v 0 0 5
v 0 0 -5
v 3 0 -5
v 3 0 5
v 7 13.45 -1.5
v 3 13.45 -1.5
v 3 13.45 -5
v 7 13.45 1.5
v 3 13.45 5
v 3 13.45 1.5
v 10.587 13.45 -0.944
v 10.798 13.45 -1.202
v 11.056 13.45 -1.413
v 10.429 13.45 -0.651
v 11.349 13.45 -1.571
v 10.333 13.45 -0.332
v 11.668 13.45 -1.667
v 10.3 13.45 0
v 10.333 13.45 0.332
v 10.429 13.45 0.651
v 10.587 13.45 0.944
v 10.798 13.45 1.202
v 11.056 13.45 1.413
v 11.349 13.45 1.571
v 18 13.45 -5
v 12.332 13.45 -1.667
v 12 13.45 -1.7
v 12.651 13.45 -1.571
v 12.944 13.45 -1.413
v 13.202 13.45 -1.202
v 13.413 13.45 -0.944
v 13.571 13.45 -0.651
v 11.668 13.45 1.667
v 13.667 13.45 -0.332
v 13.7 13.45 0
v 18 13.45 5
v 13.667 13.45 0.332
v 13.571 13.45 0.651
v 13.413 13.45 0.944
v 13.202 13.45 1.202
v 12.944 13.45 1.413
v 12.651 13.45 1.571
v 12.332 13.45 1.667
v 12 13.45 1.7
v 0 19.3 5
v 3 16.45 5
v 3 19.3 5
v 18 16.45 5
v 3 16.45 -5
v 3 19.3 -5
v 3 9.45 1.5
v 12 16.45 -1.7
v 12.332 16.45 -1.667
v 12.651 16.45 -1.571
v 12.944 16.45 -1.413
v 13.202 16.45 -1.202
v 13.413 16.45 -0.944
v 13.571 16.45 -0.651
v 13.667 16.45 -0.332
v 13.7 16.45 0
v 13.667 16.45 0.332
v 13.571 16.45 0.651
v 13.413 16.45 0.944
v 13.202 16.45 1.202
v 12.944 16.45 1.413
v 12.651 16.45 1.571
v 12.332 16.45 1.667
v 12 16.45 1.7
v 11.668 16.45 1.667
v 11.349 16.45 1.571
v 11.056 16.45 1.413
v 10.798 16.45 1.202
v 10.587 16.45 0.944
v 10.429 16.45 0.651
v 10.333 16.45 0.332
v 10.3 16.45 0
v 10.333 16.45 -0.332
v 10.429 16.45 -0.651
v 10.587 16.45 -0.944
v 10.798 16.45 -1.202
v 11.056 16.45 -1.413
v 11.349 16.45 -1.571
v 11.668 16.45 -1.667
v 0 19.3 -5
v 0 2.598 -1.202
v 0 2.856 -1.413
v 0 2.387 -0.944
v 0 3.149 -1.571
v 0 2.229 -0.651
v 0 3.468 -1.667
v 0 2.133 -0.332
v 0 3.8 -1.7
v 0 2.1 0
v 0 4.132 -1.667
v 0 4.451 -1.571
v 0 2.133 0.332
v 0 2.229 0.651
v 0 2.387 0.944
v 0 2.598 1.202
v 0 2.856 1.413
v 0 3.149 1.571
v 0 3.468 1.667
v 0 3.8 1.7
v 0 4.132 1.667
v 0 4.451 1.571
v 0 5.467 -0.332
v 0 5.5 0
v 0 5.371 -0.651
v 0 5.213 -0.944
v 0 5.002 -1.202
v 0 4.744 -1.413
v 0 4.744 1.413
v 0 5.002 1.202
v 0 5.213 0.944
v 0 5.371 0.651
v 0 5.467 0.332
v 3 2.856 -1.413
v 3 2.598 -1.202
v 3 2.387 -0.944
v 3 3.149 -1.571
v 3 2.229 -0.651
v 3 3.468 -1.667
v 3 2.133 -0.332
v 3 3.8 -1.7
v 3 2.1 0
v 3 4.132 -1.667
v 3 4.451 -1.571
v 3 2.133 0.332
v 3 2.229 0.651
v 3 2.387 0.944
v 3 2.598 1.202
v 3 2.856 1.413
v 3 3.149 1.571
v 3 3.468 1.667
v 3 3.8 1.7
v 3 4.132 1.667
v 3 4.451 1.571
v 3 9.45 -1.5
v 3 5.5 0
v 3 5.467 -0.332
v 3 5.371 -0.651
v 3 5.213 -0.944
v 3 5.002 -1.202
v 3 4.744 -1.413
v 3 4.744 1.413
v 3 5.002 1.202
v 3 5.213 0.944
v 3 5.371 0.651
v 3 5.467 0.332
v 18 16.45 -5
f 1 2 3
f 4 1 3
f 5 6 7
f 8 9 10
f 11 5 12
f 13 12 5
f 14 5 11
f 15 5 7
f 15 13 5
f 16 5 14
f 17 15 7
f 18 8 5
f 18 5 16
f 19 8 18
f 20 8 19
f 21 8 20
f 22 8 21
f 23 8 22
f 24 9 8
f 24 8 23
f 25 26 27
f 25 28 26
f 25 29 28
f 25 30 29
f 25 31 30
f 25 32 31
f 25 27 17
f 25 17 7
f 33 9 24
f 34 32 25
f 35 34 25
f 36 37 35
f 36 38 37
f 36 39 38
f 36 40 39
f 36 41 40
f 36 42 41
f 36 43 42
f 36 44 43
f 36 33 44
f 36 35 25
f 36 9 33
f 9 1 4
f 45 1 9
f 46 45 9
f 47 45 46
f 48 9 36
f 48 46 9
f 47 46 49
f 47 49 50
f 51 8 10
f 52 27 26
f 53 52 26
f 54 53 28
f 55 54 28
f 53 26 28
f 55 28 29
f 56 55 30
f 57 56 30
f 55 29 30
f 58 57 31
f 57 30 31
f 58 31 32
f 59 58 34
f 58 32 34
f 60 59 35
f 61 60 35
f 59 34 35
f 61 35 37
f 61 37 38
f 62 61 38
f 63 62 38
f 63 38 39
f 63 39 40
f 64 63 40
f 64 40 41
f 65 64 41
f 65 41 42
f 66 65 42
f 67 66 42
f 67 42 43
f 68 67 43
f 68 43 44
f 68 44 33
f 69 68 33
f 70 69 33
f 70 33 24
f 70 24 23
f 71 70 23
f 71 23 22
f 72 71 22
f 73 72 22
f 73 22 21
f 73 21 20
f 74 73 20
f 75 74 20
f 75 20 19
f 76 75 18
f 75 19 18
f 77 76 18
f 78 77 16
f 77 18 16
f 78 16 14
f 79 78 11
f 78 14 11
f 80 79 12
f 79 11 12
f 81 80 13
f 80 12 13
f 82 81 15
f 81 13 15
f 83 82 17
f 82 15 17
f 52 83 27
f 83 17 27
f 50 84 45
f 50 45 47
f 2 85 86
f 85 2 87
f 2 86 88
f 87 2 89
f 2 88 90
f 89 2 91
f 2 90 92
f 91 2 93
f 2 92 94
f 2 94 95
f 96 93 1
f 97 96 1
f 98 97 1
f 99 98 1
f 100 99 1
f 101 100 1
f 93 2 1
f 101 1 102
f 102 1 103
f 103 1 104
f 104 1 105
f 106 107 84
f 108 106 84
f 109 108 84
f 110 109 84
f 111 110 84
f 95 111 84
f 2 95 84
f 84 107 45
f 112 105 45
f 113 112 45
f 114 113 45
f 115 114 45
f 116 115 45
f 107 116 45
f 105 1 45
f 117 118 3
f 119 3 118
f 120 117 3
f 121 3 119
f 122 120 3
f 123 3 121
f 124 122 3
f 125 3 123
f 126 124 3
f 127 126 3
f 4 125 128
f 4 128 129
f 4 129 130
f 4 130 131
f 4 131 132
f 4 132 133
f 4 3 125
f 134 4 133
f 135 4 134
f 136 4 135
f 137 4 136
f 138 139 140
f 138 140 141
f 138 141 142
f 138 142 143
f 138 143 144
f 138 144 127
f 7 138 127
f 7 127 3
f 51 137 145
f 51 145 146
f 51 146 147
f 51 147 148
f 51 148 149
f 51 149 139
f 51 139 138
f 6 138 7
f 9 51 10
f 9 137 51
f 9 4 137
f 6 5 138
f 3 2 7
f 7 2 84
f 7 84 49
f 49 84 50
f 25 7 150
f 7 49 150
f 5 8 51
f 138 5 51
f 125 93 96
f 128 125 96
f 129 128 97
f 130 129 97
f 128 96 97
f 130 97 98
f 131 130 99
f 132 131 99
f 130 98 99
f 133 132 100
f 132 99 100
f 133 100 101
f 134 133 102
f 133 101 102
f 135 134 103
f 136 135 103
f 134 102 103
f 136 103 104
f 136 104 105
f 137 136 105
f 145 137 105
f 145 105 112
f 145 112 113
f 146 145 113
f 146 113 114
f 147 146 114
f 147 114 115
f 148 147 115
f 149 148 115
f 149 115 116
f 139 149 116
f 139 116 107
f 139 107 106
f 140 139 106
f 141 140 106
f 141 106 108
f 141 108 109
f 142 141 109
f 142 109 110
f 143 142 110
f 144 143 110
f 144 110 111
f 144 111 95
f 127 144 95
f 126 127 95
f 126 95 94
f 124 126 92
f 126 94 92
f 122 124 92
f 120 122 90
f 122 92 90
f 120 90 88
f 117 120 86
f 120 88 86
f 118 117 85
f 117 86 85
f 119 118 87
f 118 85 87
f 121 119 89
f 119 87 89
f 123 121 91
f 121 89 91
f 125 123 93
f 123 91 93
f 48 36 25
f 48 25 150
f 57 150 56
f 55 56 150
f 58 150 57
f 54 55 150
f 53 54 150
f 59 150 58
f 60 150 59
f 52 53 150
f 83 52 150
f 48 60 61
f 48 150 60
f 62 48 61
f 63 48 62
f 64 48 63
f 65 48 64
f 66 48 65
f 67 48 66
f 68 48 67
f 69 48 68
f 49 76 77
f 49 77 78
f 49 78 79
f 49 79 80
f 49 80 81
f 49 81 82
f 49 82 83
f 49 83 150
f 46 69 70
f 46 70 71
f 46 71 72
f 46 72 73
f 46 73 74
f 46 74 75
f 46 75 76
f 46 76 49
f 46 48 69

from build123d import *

# Parameters (mm, degrees)
BOSS_EXTRUDE1_DEPTH = 5
SKETCH2_R           = 1.7
CUT_EXTRUDE1_DEPTH  = 25.891815924
SKETCH3_R           = 1.7
CUT_EXTRUDE2_DEPTH  = 24.019611204
SKETCH5_W           = 3
SKETCH5_H           = 2.85
BOSS_EXTRUDE2_DEPTH = 10
BOSS_EXTRUDE3_DEPTH = 1.5


with BuildPart() as part:
    # Sketch1 → Boss-Extrude1 (new, symmetric)
    with BuildSketch(Plane.XY):
        Polygon((0, 0), (3, 0), (3, 13.45), (18, 13.45), (18, 16.45), (0, 16.45), align=None)
    extrude(amount=BOSS_EXTRUDE1_DEPTH, both=True)

    # Sketch2 → Cut-Extrude1 (cut, through all)
    with BuildSketch(Plane.ZY):
        with Locations(Location((0, 3.8, 0), (0, 0, 270))):
            Circle(SKETCH2_R)
    extrude(amount=-CUT_EXTRUDE1_DEPTH, mode=Mode.SUBTRACT)

    # Sketch3 → Cut-Extrude2 (cut, through all)
    with BuildSketch(Plane.XZ.offset(-13.45)):
        with Locations(Location((12, 0, 0), (0, 0, 270))):
            Circle(SKETCH3_R)
    extrude(amount=-CUT_EXTRUDE2_DEPTH, mode=Mode.SUBTRACT)

    # Sketch5 → Boss-Extrude2 (add)
    with BuildSketch(Plane.XY.offset(5)):
        with Locations((1.5, 17.875)):
            Rectangle(SKETCH5_W, SKETCH5_H)
    extrude(amount=-BOSS_EXTRUDE2_DEPTH)

    # Sketch6 → Boss-Extrude3 (add, symmetric)
    with BuildSketch(Plane.XY):
        Polygon((7, 13.45), (3, 9.45), (3, 13.45), align=None)
    extrude(amount=BOSS_EXTRUDE3_DEPTH, both=True)


solid = part.part
